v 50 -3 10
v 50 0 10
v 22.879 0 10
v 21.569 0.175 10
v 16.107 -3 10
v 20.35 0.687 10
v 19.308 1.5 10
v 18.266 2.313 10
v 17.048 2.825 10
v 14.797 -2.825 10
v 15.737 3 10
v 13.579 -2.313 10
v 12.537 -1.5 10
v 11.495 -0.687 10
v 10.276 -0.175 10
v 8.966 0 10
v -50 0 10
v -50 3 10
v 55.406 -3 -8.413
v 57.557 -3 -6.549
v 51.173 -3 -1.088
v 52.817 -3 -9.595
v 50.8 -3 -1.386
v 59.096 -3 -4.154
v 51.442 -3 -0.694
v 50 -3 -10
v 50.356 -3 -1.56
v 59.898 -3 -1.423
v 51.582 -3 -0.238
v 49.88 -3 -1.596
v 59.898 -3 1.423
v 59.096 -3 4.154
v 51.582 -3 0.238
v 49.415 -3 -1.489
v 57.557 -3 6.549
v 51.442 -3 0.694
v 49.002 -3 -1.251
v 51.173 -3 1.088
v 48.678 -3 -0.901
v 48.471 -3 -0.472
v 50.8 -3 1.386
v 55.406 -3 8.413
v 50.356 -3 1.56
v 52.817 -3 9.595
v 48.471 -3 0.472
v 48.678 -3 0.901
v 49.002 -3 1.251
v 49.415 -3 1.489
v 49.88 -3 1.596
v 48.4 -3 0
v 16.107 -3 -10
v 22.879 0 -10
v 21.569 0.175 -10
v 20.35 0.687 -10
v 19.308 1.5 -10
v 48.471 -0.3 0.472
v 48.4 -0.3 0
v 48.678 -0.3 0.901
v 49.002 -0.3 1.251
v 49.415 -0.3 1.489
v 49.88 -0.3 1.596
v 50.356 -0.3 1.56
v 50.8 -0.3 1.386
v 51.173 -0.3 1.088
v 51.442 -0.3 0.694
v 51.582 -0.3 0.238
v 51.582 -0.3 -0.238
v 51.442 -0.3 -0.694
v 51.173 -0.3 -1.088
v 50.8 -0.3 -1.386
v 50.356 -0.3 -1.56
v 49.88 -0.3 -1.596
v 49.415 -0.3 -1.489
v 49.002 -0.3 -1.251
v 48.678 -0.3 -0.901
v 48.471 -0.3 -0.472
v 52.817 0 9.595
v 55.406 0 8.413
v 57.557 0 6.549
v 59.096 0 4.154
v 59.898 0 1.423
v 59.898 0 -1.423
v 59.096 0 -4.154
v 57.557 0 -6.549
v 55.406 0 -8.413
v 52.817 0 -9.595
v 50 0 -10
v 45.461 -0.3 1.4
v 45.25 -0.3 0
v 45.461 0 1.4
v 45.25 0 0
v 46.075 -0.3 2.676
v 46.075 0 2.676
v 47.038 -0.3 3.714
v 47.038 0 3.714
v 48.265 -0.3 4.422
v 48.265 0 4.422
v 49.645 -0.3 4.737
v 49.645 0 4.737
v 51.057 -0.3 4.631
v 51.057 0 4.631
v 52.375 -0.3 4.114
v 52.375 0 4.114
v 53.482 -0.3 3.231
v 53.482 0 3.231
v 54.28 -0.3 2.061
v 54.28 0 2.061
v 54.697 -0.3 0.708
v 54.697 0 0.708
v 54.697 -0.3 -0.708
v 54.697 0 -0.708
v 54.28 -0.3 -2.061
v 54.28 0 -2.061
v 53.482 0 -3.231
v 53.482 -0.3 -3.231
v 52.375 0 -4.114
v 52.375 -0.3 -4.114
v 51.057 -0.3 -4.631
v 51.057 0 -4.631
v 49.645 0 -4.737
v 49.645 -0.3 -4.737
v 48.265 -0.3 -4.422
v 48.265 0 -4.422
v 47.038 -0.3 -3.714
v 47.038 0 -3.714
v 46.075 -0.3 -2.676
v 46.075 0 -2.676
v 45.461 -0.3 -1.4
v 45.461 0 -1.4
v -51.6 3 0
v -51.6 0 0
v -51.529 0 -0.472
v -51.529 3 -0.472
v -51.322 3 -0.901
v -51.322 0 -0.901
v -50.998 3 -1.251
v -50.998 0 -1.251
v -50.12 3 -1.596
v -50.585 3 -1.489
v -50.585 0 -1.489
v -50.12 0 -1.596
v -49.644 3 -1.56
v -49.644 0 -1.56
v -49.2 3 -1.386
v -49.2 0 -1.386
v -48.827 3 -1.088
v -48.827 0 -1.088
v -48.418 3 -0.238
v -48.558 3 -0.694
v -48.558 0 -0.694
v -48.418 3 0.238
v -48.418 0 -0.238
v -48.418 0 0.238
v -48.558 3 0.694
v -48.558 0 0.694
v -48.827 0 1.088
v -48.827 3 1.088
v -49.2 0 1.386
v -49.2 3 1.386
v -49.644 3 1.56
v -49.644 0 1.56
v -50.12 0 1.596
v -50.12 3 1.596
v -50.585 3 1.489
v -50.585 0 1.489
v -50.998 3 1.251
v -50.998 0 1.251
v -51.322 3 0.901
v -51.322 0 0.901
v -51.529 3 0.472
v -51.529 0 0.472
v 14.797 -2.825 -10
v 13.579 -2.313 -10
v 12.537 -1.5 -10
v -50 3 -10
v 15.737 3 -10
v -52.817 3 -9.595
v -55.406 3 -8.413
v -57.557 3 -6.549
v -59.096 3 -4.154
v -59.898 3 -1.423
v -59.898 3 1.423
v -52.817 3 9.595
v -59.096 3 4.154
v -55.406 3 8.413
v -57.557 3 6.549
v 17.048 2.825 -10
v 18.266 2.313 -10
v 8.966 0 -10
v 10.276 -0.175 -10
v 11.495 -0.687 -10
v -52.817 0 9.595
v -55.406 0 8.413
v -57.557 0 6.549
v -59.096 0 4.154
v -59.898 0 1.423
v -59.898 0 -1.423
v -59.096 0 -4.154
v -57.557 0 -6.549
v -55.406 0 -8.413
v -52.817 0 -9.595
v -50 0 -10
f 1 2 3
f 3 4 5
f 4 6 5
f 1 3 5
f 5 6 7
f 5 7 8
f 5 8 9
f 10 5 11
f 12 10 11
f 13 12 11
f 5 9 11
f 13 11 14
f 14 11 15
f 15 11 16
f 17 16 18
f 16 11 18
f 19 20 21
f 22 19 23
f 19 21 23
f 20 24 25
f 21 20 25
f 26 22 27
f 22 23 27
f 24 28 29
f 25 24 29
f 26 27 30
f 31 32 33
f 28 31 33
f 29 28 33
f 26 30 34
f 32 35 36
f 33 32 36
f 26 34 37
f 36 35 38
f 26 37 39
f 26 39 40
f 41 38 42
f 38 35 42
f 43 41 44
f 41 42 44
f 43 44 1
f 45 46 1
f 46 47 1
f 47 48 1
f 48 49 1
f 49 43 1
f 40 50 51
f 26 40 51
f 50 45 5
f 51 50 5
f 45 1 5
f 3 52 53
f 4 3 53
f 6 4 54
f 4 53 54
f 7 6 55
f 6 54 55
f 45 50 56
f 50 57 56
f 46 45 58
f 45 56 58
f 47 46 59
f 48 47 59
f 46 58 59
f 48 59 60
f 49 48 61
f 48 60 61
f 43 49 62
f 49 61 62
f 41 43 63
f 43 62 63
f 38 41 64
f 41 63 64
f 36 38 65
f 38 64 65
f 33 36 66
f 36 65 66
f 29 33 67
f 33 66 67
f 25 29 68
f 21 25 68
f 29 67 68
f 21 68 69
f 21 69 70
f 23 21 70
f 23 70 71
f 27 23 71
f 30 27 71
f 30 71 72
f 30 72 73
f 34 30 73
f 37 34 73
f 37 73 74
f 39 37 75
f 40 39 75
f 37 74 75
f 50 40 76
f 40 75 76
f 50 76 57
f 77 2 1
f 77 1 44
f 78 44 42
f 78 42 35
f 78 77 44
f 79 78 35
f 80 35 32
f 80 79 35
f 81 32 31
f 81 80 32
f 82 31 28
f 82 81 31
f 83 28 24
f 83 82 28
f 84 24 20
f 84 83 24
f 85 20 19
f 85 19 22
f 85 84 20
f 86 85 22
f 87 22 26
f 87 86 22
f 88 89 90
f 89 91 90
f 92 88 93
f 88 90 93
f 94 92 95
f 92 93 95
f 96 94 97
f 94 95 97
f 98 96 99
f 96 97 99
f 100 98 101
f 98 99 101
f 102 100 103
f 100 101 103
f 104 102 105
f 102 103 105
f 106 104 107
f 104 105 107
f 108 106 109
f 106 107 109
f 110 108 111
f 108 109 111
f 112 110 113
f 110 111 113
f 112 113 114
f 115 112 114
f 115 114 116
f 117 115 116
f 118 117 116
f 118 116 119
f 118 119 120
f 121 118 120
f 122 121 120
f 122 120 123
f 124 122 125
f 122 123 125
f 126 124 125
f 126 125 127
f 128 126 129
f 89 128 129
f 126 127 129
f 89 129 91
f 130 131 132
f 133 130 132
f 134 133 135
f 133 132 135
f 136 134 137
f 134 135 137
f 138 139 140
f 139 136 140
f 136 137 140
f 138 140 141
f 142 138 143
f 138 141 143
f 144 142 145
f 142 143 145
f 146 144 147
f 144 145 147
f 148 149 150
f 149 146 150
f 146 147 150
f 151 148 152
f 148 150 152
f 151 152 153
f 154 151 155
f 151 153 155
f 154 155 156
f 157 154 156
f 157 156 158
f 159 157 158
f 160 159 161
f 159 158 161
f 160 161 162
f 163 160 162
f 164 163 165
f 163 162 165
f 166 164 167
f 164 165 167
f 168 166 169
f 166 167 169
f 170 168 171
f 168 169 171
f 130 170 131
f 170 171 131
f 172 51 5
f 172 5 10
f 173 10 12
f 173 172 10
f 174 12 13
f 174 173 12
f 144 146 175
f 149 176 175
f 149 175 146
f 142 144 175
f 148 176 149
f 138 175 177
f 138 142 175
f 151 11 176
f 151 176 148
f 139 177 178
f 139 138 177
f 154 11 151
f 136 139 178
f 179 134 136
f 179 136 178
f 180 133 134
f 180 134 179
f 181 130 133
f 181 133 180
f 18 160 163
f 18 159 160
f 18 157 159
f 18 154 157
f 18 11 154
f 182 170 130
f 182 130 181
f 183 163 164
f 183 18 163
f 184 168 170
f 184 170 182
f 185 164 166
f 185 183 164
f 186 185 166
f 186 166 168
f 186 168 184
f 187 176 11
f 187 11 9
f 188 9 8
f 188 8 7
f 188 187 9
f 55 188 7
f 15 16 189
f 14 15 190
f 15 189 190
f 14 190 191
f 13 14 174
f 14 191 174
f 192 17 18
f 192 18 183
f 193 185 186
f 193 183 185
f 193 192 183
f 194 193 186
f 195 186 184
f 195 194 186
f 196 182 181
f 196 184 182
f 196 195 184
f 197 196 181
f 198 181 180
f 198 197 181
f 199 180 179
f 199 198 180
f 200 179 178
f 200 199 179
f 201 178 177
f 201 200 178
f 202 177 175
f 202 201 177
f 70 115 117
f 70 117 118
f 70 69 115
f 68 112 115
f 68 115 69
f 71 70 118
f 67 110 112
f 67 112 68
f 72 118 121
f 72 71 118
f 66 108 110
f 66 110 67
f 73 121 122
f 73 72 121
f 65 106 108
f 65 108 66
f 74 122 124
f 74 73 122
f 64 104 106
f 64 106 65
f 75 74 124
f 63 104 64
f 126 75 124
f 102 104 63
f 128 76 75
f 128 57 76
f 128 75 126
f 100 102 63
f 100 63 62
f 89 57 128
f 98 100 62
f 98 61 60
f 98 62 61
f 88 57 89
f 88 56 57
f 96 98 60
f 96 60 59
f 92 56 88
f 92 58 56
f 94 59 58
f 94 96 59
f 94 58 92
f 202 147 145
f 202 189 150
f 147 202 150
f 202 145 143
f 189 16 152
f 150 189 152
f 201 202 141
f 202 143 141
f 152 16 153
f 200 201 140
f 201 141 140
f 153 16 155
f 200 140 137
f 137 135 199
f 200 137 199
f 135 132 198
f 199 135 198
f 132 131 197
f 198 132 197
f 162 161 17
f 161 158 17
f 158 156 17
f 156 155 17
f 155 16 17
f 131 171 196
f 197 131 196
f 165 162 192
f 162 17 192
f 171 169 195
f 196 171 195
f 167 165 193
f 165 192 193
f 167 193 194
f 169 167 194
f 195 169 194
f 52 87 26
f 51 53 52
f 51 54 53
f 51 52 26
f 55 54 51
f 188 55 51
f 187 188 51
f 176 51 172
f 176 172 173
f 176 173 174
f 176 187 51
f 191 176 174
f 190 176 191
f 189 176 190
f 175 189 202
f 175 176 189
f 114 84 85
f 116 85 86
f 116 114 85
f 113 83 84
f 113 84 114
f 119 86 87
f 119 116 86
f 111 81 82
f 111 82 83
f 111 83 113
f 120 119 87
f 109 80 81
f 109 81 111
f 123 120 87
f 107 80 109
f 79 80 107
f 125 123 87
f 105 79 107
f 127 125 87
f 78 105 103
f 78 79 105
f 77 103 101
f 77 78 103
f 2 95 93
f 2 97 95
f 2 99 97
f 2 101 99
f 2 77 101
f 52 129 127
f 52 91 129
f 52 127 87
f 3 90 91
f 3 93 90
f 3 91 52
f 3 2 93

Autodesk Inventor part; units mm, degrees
ref_plane "YZ Plane" through (0, 0, 0) normal (1, 0, 0) x (0, 1, 0)
ref_plane "XZ Plane" through (0, 0, 0) normal (0, 1, 0) x (-1, 0, 0)
ref_plane "XY Plane" through (0, 0, 0) normal (0, 0, 1) x (1, 0, 0)
sketch "Sketch1" plane through (0, 0, 0) normal (0, 1, 0) x (-1, 0, 0)
  line L0 (-50, 10) -> (-18.2962, 10)
  line L1 (-50, -10) -> (-18.2962, -10)
  arc A0 (50, -10) -> (50, 10) centre (50, 0) ccw
  arc A1 (-50, 10) -> (-50, -10) centre (-50, 0) ccw
  circle A2 centre (50, 0) radius 1.6
  line L2 (0, 0) -> (0, -27.365) construction
  line L3 (0, 0) -> (19.8022, 0) construction
  circle A3 centre (50, 0) radius 4.75
  circle A4 centre (-50, 0) radius 1.6
  circle A5 centre (-50, 0) radius 4.75
  line L4 (-13.5485, -10) -> (-13.5485, 10)
  line L5 (-18.2962, -10) -> (-18.2962, 10)
  line L6 (-18.2962, 10) -> (-13.5485, 10)
  line L7 (-13.5485, 10) -> (50, 10)
  line L8 (-18.2962, -10) -> (-13.5485, -10)
  line L9 (-13.5485, -10) -> (50, -10)
  dimension "d1" = 100
  dimension "d2" = 10
  dimension "d3" = 3.2
  dimension "d4" = 9.5
extrude "Extrusion1" add sketch "Sketch1" against normal blind 3 contours L0 L5 L1 A1 | L6 L4 L8 L5 | A5
extrude "Extrusion2" cut sketch "Sketch1" against normal blind 0.3 contours A3 | A5
extrude "Extrusion3" add sketch "Sketch1" along normal blind 3 contours L6 L4 L8 L5 | L7 A0 L9 L4 | A3
fillet "Fillet1" radius 5 4 edges at (18.2962, 3, 0) (18.2962, 0, 0) (13.5485, 0, 0) (13.5485, -3, 0)
properties part number "ramie3"
